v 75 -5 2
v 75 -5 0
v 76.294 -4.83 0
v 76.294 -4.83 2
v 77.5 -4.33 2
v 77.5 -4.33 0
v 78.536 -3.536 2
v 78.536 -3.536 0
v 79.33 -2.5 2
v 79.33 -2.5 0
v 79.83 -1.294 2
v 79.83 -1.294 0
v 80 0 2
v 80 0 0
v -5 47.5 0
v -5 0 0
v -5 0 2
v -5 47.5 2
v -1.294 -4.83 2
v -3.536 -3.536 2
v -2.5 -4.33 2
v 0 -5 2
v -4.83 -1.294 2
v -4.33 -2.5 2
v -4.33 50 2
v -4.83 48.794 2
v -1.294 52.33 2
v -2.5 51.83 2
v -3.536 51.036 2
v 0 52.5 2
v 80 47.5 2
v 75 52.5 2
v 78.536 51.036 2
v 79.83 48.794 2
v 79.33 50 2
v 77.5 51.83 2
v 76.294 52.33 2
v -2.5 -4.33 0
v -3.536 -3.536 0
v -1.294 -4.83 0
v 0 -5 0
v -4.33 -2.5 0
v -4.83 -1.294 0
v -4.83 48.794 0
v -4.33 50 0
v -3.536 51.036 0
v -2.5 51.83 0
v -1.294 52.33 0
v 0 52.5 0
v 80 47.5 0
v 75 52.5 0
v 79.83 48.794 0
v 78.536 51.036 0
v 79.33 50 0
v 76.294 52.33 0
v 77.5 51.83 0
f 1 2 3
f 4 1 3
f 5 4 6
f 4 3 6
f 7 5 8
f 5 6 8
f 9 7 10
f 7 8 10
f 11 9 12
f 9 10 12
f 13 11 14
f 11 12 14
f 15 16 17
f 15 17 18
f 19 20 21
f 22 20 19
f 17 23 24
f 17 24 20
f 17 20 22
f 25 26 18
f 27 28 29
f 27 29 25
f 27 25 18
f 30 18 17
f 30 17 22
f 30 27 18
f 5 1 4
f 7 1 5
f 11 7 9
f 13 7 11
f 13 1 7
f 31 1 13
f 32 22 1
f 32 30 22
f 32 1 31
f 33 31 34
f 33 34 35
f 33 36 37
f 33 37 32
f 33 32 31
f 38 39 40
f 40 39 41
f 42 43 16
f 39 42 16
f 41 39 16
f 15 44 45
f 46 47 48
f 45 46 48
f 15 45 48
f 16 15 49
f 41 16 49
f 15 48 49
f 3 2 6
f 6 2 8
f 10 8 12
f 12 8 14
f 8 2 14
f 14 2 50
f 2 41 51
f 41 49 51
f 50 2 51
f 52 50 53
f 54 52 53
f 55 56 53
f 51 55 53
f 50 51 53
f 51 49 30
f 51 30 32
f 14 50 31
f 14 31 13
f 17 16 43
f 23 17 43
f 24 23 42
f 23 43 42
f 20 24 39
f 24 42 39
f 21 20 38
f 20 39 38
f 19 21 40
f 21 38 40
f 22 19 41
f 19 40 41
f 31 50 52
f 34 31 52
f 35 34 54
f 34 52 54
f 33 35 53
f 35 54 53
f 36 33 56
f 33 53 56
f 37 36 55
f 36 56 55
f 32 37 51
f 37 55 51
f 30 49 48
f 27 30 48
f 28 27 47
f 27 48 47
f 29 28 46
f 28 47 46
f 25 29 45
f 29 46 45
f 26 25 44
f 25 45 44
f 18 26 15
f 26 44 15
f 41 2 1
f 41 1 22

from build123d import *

# Parameters (mm, degrees)
PAD_DEPTH = 2


with BuildPart() as part:
    # Sketch → Pad (new body)
    with BuildSketch(Plane.XY):
        with BuildLine():
            ThreePointArc((0, 52.5), (-3.535534, 51.035534), (-5, 47.5))
            Line((-5, 0), (-5, 47.5))
            ThreePointArc((-5, 0), (-3.535534, -3.535534), (0, -5))
            Line((75, -5), (0, -5))
            ThreePointArc((75, -5), (78.535534, -3.535534), (80, 0))
            Line((80, 47.5), (80, 0))
            ThreePointArc((80, 47.5), (78.535534, 51.035534), (75, 52.5))
            Line((0, 52.5), (75, 52.5))
        make_face()
    extrude(amount=PAD_DEPTH)


solid = part.part
